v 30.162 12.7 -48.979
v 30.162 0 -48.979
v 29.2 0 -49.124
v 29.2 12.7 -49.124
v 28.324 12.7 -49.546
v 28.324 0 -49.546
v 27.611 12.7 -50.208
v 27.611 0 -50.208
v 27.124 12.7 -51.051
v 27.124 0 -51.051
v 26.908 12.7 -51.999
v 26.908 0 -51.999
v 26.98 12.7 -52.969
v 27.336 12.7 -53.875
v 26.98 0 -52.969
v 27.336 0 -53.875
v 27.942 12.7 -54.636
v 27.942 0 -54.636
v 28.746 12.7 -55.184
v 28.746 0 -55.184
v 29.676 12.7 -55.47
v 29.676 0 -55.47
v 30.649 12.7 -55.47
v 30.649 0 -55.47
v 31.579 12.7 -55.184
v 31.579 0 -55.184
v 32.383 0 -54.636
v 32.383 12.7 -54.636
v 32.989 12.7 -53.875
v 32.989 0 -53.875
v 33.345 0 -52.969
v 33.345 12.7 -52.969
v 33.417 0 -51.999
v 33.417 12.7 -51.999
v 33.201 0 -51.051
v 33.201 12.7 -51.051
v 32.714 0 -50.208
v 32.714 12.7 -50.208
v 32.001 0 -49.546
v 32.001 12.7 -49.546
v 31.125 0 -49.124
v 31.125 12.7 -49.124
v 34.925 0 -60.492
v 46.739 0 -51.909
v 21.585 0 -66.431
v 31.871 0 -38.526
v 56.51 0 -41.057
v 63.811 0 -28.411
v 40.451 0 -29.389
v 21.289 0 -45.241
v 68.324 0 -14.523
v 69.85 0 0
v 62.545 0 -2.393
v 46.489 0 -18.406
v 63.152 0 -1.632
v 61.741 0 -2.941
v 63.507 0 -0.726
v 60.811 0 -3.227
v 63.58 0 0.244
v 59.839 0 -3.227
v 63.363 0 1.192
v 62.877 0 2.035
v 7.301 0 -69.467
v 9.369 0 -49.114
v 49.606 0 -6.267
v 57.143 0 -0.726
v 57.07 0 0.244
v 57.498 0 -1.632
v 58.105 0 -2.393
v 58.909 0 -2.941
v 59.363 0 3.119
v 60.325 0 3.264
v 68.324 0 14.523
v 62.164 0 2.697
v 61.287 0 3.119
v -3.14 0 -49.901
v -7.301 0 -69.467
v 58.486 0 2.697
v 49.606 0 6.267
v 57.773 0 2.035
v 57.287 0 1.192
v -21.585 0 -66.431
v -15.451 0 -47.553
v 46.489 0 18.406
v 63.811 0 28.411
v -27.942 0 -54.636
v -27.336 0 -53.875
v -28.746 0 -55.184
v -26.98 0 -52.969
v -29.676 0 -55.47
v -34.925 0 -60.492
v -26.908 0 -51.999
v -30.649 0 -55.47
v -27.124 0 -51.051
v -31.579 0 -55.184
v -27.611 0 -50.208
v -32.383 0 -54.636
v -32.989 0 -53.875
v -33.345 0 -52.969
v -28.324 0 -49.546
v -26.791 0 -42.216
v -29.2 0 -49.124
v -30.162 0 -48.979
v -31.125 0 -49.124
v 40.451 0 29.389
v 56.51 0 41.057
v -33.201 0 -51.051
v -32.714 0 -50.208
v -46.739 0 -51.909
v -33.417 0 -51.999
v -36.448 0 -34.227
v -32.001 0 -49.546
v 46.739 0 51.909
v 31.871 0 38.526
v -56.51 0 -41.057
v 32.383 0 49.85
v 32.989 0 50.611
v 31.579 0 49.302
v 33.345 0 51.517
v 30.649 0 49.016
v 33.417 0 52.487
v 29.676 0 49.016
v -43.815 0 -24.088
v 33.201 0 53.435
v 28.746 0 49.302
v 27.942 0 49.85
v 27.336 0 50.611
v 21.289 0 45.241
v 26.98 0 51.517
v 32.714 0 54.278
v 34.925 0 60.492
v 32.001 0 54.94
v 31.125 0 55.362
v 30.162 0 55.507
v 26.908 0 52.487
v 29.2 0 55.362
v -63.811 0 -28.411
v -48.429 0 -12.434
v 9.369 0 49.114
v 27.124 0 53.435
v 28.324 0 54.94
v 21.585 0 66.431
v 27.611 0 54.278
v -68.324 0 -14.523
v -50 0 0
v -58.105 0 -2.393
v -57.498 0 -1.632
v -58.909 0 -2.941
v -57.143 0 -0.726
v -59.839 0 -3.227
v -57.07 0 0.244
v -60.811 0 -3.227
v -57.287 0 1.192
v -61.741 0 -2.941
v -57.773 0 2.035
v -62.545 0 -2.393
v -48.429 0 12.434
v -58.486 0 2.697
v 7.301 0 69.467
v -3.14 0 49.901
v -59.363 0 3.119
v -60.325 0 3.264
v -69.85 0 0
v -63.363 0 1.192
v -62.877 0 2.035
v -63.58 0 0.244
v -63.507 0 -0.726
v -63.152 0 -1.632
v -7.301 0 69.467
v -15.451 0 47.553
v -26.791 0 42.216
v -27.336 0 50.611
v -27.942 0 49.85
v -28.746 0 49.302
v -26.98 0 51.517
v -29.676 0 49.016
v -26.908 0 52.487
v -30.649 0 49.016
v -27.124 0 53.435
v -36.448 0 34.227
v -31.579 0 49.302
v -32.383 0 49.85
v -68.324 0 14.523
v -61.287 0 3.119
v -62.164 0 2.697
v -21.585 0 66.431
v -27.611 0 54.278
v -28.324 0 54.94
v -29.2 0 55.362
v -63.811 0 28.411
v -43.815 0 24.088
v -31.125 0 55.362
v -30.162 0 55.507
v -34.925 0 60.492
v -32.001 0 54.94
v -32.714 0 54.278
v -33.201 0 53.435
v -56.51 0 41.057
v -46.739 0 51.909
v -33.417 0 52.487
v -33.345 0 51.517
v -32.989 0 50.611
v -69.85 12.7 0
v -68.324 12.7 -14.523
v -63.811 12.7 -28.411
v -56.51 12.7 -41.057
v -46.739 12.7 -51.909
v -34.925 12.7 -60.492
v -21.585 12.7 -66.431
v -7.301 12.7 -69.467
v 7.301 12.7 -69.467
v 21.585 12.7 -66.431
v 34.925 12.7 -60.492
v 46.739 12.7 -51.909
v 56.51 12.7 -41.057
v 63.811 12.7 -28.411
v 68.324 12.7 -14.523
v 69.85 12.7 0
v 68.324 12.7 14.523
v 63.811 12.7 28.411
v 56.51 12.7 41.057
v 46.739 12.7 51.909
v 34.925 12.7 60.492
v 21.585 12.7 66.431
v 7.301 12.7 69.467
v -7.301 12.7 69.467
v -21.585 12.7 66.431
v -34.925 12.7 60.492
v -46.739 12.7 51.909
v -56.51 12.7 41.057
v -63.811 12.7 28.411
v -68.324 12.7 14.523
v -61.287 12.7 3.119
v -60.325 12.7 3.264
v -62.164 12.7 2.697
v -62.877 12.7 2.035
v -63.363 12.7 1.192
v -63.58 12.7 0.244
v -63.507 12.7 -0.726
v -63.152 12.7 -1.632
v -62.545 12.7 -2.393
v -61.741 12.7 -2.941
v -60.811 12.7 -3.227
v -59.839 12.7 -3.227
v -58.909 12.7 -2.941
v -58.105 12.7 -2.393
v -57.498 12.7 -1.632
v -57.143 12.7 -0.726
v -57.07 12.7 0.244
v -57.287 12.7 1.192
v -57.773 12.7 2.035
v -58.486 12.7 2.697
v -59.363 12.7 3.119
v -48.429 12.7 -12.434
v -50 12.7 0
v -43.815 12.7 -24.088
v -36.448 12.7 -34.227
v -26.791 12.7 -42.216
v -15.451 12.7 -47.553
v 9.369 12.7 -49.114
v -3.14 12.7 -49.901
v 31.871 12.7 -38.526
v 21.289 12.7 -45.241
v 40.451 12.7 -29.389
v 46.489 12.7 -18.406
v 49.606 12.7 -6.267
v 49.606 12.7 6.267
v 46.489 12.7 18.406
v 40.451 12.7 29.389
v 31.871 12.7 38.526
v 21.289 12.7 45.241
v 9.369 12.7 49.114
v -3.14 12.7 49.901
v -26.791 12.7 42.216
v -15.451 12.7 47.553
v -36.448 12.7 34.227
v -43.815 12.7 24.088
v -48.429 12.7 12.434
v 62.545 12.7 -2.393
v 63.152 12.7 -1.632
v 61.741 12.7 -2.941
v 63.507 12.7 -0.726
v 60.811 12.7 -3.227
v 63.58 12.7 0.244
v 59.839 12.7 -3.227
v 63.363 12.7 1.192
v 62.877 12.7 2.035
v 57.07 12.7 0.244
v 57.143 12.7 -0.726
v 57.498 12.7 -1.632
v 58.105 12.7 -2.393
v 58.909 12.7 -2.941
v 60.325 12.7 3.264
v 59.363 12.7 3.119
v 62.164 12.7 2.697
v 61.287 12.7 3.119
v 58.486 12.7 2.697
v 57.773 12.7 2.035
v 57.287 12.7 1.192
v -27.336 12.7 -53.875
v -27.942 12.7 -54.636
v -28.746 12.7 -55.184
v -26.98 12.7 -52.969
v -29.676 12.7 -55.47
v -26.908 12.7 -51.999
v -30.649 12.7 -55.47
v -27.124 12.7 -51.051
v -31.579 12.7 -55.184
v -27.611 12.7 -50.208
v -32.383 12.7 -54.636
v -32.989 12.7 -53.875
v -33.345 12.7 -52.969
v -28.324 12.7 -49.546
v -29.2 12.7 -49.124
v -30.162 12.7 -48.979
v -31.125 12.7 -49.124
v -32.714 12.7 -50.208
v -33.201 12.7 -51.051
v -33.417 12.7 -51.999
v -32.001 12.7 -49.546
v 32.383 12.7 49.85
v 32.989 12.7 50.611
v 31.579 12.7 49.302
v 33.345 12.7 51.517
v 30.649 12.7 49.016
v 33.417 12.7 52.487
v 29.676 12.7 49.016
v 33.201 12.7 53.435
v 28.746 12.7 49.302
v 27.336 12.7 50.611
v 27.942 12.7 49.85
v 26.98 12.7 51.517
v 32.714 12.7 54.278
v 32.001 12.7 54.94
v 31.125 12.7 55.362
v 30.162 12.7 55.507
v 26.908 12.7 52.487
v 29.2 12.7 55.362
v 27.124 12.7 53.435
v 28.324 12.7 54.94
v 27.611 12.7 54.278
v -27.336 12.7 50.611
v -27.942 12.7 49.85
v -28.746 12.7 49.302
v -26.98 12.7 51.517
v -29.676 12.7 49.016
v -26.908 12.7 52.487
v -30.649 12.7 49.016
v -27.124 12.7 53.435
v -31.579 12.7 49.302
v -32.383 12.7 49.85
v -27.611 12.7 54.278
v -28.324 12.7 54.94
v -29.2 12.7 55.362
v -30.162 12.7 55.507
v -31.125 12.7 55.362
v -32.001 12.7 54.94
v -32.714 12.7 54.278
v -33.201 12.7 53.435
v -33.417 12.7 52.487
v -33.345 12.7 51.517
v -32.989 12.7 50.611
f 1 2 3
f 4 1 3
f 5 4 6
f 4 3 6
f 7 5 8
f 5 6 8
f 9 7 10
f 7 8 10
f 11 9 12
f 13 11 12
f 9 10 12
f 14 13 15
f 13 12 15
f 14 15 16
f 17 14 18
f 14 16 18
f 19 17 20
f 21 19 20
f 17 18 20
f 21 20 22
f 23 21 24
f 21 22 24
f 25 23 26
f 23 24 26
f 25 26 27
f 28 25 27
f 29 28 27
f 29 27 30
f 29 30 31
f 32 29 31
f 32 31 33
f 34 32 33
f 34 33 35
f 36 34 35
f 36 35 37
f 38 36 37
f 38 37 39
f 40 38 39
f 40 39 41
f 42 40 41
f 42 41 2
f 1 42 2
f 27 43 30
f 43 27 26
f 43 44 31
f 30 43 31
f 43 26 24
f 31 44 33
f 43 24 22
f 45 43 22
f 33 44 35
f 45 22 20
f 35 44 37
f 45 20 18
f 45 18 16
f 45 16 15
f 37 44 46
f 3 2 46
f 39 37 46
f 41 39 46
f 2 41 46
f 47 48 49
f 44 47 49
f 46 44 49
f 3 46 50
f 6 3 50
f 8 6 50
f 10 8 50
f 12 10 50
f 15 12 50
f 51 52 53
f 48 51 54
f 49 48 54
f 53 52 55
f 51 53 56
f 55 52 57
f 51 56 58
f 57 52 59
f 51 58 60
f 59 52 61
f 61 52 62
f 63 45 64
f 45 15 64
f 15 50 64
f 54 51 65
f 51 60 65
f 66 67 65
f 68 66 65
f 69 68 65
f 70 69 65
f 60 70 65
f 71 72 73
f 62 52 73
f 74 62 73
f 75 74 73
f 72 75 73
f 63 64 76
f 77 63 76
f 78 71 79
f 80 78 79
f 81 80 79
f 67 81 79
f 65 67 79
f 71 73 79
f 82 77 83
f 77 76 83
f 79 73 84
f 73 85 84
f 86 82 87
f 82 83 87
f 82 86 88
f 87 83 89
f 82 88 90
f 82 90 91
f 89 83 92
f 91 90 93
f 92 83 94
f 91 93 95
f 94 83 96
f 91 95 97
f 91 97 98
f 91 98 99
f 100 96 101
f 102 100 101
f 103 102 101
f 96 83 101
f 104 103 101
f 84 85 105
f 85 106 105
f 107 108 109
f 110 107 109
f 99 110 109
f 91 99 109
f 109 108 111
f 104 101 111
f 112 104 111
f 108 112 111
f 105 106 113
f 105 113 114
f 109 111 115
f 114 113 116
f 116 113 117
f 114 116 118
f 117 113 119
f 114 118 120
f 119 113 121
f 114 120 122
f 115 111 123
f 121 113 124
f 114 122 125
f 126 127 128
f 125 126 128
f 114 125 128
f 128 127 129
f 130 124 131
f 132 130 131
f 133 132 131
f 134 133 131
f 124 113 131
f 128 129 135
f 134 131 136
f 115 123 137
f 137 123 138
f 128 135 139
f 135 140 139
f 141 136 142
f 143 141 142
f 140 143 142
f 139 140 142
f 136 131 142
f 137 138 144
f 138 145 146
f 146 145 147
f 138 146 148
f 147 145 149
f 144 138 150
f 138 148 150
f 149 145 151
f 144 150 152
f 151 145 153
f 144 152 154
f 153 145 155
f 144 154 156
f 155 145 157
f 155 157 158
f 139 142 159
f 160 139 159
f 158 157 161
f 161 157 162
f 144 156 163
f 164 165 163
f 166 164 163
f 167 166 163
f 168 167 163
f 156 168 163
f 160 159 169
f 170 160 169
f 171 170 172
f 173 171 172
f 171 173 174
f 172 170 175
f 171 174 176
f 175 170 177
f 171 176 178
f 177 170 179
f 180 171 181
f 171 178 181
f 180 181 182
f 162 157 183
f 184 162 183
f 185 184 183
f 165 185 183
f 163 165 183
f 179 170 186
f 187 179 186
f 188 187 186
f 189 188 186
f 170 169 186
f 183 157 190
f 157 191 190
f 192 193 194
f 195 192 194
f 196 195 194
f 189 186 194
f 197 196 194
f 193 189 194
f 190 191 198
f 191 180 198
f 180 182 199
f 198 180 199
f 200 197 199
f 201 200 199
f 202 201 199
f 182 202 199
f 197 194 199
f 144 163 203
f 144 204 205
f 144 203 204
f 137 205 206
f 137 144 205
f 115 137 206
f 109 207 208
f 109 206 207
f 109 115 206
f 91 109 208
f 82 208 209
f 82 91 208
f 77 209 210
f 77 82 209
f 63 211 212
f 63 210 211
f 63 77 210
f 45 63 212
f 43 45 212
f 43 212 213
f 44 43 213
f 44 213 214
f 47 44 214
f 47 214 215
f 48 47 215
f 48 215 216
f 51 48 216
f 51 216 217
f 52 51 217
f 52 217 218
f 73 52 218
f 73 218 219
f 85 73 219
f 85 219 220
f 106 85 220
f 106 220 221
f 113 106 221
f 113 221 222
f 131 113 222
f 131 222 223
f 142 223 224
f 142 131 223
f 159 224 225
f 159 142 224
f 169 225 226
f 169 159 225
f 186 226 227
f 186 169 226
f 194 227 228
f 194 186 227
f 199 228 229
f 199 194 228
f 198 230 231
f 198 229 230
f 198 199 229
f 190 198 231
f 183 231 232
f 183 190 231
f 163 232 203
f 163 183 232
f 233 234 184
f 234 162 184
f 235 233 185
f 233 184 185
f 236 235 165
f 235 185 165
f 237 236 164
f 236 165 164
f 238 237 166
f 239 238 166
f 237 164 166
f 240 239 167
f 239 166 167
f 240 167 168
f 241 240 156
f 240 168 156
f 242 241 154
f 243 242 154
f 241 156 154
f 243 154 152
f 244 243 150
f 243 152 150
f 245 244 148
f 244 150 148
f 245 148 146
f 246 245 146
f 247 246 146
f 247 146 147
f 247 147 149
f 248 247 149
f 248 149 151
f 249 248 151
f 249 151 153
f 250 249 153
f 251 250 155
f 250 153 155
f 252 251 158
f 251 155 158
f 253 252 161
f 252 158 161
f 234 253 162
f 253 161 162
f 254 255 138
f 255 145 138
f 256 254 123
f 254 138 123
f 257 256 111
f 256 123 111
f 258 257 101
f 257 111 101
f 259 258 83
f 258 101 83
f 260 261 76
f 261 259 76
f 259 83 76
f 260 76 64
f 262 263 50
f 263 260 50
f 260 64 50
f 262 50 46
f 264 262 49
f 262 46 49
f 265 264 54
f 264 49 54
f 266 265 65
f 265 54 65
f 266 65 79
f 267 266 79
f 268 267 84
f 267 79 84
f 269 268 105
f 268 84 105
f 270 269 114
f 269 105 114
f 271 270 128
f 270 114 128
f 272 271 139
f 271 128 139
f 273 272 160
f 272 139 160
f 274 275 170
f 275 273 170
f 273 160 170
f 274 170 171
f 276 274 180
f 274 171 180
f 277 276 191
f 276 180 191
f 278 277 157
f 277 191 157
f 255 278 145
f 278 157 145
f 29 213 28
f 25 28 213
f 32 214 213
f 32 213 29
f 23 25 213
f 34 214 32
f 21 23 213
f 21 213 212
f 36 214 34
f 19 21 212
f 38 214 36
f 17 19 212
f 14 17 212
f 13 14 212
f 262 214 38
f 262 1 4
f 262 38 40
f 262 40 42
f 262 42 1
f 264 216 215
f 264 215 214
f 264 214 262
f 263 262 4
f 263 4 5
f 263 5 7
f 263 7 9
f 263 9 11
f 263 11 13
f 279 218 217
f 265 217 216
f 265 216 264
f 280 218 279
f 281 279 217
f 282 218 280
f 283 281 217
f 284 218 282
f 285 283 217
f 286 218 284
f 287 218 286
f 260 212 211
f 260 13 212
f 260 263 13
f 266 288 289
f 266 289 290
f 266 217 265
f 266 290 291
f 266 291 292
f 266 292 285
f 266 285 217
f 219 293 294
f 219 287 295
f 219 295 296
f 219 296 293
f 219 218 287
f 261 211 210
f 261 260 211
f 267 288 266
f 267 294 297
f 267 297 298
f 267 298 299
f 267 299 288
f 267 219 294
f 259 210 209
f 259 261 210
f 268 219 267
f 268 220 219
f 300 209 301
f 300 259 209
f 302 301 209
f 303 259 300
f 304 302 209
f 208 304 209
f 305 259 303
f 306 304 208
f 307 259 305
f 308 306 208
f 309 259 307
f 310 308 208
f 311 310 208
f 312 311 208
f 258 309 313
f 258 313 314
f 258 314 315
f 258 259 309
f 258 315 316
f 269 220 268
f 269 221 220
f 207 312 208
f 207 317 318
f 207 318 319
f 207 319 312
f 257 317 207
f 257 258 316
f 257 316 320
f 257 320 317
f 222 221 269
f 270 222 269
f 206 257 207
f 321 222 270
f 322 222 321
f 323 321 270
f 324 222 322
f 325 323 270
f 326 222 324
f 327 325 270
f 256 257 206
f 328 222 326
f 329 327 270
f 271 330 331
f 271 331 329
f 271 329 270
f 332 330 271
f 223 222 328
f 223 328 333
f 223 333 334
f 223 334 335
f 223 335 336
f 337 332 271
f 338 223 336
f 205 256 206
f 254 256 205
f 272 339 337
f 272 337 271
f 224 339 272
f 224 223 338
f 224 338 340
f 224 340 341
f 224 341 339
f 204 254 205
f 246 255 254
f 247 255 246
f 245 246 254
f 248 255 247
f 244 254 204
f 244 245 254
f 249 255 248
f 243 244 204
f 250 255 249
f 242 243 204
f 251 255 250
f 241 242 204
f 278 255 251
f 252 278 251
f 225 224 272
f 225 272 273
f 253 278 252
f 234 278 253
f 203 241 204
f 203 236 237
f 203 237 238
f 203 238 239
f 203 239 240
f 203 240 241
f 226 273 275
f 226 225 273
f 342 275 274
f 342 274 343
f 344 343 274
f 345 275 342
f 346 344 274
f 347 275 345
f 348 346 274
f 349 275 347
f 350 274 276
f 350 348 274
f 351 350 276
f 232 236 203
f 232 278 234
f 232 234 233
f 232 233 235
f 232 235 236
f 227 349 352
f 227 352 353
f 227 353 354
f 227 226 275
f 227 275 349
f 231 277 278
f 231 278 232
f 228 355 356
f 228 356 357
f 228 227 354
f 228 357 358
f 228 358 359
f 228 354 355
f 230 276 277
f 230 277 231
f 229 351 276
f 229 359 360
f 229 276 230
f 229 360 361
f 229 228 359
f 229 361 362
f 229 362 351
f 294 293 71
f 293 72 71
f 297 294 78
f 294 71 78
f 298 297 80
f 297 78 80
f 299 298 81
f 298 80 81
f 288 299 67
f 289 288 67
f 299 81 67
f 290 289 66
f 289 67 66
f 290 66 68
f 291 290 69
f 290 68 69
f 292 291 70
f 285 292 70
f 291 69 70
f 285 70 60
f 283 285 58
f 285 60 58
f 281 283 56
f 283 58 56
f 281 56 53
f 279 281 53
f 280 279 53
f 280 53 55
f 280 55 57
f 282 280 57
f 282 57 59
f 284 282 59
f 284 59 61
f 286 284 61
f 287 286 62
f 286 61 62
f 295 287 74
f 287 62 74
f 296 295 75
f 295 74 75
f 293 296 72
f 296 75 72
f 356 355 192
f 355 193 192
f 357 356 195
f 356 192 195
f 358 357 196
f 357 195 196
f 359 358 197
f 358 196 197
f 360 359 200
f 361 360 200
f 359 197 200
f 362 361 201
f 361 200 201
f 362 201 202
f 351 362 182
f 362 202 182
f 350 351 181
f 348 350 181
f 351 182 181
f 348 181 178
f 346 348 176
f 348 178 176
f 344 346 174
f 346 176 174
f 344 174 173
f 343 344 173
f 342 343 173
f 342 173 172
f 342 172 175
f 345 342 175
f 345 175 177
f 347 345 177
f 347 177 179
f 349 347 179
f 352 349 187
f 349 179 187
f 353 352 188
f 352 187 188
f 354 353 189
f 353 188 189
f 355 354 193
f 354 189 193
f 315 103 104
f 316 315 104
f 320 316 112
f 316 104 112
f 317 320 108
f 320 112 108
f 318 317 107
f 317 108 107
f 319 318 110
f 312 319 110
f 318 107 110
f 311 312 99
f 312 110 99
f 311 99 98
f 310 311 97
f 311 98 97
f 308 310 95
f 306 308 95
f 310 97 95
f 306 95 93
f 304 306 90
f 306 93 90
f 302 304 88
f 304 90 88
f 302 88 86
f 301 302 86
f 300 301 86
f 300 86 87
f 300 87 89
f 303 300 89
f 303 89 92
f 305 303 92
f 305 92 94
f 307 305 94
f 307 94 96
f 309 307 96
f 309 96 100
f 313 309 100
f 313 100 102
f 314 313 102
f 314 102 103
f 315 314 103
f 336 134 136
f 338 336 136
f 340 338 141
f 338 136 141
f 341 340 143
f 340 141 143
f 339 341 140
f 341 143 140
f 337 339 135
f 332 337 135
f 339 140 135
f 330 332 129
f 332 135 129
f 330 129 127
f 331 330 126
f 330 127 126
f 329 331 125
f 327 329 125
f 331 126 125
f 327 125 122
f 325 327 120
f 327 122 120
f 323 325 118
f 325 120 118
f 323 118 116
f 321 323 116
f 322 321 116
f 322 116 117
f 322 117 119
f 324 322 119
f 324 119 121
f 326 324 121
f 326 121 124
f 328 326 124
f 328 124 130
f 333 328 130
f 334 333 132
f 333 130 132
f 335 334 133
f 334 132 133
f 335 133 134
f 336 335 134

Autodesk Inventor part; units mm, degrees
ref_plane "YZ Plane" through (0, 0, 0) normal (1, 0, 0) x (0, 1, 0)
ref_plane "XZ Plane" through (0, 0, 0) normal (0, 1, 0) x (-1, 0, 0)
ref_plane "XY Plane" through (0, 0, 0) normal (0, 0, 1) x (1, 0, 0)
sketch "Sketch1" plane through (0, 0, 0) normal (0, 1, 0) x (-1, 0, 0)
  circle A0 centre (0, 0) radius 50
  circle A1 centre (0, 0) radius 69.85
  dimension "d0" = 139.7
  dimension "d1" = 100
extrude "Extrusion1" add sketch "Sketch1" along normal blind 12.7
sketch "Sketch2" plane through (0, 12.7, 0) normal (0, 1, 0) x (1, 0, 0)
  circle A0 centre (0, 0) radius 69.85 projected
  line L0 (-69.85, 0) -> (-60.325, 0)
  point P0 (-30.1625, 52.243)
  point P1 (30.1625, 52.243)
  point P2 (60.325, 0)
  point P3 (30.1625, -52.243)
  point P4 (-30.1625, -52.243)
  dimension "d4" = 9.525
  dimension "d7" = 360
hole "Hole1" at (-60.325, 12.7, 0) at (-30.1625, 12.7, -52.243) at (30.1625, 12.7, -52.243) at (60.325, 12.7, 0) at (30.1625, 12.7, 52.243) at (-30.1625, 12.7, 52.243) direction (0, -1, 0) diameter 6.5278 end through all clearance for "Socket Head Cap Screw" size "1/4" standard "Ansi Unified Screw Threads"
properties part number "BearingRing"
